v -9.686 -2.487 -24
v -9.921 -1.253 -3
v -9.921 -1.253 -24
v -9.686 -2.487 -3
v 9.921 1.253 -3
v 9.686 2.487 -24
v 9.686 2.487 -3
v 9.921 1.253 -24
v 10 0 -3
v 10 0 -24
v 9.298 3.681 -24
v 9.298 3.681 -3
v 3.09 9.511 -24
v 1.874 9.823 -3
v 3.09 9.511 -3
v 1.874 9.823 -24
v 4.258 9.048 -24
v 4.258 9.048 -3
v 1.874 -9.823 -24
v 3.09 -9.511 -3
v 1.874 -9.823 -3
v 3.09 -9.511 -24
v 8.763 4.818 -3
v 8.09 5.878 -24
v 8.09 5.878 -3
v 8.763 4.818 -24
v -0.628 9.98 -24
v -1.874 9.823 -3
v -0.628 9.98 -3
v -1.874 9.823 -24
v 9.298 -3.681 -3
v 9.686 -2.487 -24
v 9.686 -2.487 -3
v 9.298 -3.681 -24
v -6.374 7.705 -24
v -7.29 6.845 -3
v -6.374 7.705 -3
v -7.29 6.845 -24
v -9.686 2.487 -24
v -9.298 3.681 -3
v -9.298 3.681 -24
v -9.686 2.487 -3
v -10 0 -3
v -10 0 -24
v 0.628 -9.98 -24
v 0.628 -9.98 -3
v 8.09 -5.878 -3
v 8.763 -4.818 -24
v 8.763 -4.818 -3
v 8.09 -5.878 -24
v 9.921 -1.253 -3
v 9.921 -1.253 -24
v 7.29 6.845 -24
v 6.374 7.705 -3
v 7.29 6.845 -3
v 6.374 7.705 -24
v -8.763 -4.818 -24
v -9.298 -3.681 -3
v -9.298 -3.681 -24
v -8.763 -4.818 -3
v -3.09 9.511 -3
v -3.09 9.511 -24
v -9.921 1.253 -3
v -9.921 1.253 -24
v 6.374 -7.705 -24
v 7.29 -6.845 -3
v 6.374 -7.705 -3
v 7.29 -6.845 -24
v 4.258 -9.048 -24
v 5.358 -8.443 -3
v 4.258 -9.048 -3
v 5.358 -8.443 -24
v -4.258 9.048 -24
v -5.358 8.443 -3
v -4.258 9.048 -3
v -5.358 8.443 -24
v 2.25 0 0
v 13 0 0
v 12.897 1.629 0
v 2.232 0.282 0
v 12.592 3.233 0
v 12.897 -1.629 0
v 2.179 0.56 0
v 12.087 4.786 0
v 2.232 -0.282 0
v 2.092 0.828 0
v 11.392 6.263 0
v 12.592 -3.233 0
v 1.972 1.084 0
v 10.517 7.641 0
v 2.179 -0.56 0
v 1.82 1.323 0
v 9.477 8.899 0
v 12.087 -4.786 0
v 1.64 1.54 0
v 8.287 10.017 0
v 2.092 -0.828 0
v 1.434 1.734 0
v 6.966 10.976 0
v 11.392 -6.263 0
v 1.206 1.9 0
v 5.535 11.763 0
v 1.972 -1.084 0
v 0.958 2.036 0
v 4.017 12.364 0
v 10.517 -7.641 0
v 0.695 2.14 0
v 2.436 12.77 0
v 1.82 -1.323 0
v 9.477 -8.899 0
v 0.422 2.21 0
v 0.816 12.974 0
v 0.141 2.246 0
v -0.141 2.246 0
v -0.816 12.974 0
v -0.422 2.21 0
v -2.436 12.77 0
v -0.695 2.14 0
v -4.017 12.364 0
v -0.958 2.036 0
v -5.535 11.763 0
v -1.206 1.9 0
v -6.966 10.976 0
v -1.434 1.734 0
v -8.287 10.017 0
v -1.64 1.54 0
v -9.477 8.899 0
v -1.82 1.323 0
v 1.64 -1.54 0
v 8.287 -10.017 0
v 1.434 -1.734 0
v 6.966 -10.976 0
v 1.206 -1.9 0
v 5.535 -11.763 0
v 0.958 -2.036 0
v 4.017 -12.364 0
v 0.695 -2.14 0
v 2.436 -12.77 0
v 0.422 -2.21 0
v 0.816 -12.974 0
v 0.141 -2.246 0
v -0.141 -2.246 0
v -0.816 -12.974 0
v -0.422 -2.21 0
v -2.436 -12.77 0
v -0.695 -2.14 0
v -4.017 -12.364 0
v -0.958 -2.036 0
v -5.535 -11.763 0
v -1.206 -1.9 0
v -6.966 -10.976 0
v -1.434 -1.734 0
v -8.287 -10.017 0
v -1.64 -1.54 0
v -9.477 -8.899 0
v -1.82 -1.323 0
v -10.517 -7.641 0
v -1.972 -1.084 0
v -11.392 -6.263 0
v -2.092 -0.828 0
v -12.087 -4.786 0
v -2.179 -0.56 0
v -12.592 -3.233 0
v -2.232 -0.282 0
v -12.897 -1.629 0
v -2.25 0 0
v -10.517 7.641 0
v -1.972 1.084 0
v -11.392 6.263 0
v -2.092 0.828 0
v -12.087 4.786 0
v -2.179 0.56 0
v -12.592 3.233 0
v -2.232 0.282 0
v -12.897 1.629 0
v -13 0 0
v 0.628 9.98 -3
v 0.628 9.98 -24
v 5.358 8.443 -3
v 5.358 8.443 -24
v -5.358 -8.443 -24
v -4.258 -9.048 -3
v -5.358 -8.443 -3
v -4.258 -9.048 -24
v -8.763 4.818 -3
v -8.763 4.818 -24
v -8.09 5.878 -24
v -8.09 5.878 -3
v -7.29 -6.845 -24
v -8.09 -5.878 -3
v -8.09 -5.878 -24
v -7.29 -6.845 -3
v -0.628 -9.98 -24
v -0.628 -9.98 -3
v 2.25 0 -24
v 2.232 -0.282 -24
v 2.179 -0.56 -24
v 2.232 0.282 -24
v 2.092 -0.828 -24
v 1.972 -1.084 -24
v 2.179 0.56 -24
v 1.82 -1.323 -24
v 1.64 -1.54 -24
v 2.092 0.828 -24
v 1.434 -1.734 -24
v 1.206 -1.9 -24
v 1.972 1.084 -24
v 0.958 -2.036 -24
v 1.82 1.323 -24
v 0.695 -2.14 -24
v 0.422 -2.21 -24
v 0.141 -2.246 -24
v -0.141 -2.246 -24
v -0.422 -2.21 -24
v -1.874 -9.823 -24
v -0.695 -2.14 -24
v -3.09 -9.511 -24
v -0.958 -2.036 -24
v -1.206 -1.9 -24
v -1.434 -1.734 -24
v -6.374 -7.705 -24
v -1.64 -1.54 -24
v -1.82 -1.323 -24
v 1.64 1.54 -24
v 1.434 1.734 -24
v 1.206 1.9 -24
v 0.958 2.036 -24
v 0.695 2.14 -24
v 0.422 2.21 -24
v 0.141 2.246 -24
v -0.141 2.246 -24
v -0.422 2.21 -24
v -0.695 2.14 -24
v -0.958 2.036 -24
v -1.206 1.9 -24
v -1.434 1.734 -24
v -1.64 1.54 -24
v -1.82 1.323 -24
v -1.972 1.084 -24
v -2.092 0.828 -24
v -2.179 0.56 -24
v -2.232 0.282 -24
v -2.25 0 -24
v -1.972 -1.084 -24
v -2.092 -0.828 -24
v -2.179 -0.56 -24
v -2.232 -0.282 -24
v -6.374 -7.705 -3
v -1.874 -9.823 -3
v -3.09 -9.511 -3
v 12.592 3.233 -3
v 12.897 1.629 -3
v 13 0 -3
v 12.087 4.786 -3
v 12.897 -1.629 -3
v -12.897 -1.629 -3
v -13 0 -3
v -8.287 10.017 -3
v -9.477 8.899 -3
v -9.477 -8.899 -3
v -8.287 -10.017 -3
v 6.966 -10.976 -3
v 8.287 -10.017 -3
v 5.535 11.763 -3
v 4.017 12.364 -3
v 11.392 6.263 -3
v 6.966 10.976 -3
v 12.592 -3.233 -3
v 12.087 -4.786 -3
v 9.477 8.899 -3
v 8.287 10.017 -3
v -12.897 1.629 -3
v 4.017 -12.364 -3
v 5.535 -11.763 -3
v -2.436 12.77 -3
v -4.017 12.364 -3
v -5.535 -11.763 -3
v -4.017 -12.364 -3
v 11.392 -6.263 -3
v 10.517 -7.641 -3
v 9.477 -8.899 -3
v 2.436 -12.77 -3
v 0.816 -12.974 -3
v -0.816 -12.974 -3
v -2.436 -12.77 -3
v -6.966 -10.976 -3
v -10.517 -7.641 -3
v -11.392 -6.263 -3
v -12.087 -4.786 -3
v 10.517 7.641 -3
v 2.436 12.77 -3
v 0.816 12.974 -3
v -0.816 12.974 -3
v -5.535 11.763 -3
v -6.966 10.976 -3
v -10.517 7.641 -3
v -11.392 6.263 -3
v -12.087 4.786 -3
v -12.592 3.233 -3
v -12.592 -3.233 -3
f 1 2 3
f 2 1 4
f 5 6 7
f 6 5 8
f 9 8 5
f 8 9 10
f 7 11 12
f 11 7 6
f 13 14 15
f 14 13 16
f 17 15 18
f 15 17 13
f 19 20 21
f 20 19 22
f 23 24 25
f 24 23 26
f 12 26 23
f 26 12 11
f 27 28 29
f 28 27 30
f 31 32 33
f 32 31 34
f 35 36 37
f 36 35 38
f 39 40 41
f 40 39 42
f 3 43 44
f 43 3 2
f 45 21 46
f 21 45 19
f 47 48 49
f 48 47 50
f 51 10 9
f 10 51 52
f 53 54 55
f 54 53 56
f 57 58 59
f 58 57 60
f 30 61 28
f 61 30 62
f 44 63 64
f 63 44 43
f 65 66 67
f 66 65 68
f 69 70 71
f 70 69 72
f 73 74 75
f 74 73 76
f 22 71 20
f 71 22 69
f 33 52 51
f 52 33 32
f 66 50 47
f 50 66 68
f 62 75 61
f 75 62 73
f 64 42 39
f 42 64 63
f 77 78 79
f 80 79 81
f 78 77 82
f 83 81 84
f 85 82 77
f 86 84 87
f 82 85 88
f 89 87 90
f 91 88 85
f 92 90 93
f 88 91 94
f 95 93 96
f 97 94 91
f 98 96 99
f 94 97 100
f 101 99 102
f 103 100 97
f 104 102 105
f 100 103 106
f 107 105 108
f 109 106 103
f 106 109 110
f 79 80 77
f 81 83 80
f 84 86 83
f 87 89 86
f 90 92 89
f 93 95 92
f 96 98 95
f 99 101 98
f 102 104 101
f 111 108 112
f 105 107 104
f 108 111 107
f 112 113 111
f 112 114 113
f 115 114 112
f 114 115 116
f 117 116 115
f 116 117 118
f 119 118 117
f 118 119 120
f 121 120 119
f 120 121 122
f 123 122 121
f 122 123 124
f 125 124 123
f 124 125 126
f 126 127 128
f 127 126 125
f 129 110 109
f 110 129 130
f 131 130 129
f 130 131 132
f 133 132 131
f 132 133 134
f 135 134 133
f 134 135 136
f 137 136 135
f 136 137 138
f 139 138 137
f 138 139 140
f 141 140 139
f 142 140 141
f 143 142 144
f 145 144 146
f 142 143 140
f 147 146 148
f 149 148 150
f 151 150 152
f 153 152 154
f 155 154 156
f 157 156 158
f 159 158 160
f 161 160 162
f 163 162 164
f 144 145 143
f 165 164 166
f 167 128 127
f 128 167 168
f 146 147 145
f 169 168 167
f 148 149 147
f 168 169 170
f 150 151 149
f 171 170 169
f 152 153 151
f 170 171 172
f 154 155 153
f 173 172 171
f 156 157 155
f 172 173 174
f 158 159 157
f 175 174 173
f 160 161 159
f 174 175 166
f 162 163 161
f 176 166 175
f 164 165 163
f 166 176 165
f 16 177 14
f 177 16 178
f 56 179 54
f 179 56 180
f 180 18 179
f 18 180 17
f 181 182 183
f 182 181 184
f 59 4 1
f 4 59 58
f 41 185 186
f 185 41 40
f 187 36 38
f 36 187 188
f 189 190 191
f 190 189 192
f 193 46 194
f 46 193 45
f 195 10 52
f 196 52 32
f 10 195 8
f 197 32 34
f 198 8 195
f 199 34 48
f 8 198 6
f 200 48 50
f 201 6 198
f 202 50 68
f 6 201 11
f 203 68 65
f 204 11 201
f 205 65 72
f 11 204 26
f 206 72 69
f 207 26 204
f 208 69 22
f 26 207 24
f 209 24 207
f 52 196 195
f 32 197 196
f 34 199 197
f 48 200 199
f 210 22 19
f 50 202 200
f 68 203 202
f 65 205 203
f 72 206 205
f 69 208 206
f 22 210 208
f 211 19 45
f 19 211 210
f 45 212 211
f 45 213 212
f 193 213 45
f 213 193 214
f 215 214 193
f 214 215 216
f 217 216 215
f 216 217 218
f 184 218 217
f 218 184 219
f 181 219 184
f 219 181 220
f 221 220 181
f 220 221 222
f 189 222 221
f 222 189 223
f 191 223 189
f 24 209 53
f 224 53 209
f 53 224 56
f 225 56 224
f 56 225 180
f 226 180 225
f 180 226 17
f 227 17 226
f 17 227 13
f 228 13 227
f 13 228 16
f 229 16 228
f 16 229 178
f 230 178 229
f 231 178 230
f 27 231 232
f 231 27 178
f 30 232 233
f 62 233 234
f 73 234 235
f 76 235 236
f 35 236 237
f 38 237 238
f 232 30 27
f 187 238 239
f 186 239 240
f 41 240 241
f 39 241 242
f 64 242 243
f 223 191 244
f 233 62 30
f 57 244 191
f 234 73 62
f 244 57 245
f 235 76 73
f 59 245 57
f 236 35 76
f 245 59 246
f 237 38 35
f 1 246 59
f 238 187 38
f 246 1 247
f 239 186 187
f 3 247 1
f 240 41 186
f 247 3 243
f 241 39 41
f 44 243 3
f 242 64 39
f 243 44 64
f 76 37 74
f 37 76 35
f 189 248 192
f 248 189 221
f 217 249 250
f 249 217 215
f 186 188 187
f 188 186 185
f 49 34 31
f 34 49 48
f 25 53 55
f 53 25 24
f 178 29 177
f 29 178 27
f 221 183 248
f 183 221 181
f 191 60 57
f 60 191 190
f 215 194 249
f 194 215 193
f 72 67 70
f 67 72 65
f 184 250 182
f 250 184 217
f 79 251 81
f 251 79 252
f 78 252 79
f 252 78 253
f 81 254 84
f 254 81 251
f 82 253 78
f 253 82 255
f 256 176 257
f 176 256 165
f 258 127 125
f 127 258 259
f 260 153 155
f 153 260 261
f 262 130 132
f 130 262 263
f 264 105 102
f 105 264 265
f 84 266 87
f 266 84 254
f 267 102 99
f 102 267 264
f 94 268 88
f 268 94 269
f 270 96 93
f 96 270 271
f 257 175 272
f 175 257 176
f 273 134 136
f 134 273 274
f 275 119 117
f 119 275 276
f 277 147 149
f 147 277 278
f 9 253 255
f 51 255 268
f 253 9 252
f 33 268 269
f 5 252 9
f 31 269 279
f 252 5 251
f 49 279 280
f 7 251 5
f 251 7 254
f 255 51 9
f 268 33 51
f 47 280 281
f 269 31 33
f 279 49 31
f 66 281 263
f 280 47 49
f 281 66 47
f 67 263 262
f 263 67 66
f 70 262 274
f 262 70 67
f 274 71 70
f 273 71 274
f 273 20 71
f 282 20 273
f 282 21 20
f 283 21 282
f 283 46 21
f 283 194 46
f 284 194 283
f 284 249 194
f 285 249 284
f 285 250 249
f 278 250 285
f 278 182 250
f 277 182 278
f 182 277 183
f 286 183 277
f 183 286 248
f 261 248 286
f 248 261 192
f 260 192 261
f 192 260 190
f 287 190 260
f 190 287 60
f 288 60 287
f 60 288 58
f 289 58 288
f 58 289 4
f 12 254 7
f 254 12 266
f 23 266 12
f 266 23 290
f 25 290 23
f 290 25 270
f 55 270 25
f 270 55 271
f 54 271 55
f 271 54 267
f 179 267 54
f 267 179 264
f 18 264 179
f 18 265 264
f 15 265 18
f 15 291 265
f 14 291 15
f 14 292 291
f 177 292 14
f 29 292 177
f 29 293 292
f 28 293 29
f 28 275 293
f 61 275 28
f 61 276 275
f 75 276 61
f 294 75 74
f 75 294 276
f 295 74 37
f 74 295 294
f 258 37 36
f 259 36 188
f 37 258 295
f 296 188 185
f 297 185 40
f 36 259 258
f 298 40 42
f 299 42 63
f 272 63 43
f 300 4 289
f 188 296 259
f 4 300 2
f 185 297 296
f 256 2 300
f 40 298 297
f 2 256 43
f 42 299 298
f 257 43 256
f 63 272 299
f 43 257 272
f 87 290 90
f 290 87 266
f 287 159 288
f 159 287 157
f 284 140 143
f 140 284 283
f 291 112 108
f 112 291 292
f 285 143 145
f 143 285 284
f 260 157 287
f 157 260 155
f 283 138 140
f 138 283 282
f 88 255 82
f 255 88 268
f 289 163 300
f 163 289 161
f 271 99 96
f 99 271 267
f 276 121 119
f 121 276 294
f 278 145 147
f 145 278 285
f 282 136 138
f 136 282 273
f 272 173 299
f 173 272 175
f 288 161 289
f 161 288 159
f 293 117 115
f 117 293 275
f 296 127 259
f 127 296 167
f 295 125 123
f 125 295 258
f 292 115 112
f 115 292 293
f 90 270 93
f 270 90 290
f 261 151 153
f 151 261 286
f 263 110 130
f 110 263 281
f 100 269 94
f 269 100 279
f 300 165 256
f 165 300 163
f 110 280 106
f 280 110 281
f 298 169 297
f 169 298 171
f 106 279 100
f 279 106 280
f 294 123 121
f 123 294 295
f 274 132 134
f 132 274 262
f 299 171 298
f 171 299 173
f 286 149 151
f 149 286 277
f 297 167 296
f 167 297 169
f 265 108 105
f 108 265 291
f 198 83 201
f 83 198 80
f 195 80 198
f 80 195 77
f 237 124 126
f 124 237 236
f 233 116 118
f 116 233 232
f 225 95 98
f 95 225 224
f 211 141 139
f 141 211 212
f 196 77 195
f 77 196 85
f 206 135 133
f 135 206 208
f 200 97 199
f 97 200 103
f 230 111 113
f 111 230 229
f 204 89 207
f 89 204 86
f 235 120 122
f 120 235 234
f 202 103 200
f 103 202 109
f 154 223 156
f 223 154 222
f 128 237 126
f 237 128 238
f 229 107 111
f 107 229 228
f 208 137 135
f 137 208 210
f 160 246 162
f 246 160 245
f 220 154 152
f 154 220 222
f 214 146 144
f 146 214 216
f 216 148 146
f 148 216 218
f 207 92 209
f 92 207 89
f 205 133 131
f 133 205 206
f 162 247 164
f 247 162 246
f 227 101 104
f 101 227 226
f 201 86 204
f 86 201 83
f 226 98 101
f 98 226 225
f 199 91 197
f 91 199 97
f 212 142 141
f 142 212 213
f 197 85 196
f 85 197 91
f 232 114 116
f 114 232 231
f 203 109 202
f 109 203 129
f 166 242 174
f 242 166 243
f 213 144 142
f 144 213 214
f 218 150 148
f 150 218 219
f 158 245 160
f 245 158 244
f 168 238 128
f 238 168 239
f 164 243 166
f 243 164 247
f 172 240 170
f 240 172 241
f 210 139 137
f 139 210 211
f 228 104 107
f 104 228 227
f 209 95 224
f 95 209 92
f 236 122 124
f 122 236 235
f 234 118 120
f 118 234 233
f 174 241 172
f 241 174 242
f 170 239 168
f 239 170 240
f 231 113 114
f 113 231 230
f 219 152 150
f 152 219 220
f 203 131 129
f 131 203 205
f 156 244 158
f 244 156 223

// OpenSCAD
$fn = 50;


difference() {
	union() {
		translate(v = [0, 0, -24.0000000000]) {
			cylinder(h = 24, r = 10.0000000000);
		}
		translate(v = [0, 0, -3.0000000000]) {
			cylinder(h = 3, r = 13.0000000000);
		}
	}
	union() {
		#translate(v = [0, 0, -24]) {
			cylinder(h = 24, r = 2.2500000000);
		}
	}
}
